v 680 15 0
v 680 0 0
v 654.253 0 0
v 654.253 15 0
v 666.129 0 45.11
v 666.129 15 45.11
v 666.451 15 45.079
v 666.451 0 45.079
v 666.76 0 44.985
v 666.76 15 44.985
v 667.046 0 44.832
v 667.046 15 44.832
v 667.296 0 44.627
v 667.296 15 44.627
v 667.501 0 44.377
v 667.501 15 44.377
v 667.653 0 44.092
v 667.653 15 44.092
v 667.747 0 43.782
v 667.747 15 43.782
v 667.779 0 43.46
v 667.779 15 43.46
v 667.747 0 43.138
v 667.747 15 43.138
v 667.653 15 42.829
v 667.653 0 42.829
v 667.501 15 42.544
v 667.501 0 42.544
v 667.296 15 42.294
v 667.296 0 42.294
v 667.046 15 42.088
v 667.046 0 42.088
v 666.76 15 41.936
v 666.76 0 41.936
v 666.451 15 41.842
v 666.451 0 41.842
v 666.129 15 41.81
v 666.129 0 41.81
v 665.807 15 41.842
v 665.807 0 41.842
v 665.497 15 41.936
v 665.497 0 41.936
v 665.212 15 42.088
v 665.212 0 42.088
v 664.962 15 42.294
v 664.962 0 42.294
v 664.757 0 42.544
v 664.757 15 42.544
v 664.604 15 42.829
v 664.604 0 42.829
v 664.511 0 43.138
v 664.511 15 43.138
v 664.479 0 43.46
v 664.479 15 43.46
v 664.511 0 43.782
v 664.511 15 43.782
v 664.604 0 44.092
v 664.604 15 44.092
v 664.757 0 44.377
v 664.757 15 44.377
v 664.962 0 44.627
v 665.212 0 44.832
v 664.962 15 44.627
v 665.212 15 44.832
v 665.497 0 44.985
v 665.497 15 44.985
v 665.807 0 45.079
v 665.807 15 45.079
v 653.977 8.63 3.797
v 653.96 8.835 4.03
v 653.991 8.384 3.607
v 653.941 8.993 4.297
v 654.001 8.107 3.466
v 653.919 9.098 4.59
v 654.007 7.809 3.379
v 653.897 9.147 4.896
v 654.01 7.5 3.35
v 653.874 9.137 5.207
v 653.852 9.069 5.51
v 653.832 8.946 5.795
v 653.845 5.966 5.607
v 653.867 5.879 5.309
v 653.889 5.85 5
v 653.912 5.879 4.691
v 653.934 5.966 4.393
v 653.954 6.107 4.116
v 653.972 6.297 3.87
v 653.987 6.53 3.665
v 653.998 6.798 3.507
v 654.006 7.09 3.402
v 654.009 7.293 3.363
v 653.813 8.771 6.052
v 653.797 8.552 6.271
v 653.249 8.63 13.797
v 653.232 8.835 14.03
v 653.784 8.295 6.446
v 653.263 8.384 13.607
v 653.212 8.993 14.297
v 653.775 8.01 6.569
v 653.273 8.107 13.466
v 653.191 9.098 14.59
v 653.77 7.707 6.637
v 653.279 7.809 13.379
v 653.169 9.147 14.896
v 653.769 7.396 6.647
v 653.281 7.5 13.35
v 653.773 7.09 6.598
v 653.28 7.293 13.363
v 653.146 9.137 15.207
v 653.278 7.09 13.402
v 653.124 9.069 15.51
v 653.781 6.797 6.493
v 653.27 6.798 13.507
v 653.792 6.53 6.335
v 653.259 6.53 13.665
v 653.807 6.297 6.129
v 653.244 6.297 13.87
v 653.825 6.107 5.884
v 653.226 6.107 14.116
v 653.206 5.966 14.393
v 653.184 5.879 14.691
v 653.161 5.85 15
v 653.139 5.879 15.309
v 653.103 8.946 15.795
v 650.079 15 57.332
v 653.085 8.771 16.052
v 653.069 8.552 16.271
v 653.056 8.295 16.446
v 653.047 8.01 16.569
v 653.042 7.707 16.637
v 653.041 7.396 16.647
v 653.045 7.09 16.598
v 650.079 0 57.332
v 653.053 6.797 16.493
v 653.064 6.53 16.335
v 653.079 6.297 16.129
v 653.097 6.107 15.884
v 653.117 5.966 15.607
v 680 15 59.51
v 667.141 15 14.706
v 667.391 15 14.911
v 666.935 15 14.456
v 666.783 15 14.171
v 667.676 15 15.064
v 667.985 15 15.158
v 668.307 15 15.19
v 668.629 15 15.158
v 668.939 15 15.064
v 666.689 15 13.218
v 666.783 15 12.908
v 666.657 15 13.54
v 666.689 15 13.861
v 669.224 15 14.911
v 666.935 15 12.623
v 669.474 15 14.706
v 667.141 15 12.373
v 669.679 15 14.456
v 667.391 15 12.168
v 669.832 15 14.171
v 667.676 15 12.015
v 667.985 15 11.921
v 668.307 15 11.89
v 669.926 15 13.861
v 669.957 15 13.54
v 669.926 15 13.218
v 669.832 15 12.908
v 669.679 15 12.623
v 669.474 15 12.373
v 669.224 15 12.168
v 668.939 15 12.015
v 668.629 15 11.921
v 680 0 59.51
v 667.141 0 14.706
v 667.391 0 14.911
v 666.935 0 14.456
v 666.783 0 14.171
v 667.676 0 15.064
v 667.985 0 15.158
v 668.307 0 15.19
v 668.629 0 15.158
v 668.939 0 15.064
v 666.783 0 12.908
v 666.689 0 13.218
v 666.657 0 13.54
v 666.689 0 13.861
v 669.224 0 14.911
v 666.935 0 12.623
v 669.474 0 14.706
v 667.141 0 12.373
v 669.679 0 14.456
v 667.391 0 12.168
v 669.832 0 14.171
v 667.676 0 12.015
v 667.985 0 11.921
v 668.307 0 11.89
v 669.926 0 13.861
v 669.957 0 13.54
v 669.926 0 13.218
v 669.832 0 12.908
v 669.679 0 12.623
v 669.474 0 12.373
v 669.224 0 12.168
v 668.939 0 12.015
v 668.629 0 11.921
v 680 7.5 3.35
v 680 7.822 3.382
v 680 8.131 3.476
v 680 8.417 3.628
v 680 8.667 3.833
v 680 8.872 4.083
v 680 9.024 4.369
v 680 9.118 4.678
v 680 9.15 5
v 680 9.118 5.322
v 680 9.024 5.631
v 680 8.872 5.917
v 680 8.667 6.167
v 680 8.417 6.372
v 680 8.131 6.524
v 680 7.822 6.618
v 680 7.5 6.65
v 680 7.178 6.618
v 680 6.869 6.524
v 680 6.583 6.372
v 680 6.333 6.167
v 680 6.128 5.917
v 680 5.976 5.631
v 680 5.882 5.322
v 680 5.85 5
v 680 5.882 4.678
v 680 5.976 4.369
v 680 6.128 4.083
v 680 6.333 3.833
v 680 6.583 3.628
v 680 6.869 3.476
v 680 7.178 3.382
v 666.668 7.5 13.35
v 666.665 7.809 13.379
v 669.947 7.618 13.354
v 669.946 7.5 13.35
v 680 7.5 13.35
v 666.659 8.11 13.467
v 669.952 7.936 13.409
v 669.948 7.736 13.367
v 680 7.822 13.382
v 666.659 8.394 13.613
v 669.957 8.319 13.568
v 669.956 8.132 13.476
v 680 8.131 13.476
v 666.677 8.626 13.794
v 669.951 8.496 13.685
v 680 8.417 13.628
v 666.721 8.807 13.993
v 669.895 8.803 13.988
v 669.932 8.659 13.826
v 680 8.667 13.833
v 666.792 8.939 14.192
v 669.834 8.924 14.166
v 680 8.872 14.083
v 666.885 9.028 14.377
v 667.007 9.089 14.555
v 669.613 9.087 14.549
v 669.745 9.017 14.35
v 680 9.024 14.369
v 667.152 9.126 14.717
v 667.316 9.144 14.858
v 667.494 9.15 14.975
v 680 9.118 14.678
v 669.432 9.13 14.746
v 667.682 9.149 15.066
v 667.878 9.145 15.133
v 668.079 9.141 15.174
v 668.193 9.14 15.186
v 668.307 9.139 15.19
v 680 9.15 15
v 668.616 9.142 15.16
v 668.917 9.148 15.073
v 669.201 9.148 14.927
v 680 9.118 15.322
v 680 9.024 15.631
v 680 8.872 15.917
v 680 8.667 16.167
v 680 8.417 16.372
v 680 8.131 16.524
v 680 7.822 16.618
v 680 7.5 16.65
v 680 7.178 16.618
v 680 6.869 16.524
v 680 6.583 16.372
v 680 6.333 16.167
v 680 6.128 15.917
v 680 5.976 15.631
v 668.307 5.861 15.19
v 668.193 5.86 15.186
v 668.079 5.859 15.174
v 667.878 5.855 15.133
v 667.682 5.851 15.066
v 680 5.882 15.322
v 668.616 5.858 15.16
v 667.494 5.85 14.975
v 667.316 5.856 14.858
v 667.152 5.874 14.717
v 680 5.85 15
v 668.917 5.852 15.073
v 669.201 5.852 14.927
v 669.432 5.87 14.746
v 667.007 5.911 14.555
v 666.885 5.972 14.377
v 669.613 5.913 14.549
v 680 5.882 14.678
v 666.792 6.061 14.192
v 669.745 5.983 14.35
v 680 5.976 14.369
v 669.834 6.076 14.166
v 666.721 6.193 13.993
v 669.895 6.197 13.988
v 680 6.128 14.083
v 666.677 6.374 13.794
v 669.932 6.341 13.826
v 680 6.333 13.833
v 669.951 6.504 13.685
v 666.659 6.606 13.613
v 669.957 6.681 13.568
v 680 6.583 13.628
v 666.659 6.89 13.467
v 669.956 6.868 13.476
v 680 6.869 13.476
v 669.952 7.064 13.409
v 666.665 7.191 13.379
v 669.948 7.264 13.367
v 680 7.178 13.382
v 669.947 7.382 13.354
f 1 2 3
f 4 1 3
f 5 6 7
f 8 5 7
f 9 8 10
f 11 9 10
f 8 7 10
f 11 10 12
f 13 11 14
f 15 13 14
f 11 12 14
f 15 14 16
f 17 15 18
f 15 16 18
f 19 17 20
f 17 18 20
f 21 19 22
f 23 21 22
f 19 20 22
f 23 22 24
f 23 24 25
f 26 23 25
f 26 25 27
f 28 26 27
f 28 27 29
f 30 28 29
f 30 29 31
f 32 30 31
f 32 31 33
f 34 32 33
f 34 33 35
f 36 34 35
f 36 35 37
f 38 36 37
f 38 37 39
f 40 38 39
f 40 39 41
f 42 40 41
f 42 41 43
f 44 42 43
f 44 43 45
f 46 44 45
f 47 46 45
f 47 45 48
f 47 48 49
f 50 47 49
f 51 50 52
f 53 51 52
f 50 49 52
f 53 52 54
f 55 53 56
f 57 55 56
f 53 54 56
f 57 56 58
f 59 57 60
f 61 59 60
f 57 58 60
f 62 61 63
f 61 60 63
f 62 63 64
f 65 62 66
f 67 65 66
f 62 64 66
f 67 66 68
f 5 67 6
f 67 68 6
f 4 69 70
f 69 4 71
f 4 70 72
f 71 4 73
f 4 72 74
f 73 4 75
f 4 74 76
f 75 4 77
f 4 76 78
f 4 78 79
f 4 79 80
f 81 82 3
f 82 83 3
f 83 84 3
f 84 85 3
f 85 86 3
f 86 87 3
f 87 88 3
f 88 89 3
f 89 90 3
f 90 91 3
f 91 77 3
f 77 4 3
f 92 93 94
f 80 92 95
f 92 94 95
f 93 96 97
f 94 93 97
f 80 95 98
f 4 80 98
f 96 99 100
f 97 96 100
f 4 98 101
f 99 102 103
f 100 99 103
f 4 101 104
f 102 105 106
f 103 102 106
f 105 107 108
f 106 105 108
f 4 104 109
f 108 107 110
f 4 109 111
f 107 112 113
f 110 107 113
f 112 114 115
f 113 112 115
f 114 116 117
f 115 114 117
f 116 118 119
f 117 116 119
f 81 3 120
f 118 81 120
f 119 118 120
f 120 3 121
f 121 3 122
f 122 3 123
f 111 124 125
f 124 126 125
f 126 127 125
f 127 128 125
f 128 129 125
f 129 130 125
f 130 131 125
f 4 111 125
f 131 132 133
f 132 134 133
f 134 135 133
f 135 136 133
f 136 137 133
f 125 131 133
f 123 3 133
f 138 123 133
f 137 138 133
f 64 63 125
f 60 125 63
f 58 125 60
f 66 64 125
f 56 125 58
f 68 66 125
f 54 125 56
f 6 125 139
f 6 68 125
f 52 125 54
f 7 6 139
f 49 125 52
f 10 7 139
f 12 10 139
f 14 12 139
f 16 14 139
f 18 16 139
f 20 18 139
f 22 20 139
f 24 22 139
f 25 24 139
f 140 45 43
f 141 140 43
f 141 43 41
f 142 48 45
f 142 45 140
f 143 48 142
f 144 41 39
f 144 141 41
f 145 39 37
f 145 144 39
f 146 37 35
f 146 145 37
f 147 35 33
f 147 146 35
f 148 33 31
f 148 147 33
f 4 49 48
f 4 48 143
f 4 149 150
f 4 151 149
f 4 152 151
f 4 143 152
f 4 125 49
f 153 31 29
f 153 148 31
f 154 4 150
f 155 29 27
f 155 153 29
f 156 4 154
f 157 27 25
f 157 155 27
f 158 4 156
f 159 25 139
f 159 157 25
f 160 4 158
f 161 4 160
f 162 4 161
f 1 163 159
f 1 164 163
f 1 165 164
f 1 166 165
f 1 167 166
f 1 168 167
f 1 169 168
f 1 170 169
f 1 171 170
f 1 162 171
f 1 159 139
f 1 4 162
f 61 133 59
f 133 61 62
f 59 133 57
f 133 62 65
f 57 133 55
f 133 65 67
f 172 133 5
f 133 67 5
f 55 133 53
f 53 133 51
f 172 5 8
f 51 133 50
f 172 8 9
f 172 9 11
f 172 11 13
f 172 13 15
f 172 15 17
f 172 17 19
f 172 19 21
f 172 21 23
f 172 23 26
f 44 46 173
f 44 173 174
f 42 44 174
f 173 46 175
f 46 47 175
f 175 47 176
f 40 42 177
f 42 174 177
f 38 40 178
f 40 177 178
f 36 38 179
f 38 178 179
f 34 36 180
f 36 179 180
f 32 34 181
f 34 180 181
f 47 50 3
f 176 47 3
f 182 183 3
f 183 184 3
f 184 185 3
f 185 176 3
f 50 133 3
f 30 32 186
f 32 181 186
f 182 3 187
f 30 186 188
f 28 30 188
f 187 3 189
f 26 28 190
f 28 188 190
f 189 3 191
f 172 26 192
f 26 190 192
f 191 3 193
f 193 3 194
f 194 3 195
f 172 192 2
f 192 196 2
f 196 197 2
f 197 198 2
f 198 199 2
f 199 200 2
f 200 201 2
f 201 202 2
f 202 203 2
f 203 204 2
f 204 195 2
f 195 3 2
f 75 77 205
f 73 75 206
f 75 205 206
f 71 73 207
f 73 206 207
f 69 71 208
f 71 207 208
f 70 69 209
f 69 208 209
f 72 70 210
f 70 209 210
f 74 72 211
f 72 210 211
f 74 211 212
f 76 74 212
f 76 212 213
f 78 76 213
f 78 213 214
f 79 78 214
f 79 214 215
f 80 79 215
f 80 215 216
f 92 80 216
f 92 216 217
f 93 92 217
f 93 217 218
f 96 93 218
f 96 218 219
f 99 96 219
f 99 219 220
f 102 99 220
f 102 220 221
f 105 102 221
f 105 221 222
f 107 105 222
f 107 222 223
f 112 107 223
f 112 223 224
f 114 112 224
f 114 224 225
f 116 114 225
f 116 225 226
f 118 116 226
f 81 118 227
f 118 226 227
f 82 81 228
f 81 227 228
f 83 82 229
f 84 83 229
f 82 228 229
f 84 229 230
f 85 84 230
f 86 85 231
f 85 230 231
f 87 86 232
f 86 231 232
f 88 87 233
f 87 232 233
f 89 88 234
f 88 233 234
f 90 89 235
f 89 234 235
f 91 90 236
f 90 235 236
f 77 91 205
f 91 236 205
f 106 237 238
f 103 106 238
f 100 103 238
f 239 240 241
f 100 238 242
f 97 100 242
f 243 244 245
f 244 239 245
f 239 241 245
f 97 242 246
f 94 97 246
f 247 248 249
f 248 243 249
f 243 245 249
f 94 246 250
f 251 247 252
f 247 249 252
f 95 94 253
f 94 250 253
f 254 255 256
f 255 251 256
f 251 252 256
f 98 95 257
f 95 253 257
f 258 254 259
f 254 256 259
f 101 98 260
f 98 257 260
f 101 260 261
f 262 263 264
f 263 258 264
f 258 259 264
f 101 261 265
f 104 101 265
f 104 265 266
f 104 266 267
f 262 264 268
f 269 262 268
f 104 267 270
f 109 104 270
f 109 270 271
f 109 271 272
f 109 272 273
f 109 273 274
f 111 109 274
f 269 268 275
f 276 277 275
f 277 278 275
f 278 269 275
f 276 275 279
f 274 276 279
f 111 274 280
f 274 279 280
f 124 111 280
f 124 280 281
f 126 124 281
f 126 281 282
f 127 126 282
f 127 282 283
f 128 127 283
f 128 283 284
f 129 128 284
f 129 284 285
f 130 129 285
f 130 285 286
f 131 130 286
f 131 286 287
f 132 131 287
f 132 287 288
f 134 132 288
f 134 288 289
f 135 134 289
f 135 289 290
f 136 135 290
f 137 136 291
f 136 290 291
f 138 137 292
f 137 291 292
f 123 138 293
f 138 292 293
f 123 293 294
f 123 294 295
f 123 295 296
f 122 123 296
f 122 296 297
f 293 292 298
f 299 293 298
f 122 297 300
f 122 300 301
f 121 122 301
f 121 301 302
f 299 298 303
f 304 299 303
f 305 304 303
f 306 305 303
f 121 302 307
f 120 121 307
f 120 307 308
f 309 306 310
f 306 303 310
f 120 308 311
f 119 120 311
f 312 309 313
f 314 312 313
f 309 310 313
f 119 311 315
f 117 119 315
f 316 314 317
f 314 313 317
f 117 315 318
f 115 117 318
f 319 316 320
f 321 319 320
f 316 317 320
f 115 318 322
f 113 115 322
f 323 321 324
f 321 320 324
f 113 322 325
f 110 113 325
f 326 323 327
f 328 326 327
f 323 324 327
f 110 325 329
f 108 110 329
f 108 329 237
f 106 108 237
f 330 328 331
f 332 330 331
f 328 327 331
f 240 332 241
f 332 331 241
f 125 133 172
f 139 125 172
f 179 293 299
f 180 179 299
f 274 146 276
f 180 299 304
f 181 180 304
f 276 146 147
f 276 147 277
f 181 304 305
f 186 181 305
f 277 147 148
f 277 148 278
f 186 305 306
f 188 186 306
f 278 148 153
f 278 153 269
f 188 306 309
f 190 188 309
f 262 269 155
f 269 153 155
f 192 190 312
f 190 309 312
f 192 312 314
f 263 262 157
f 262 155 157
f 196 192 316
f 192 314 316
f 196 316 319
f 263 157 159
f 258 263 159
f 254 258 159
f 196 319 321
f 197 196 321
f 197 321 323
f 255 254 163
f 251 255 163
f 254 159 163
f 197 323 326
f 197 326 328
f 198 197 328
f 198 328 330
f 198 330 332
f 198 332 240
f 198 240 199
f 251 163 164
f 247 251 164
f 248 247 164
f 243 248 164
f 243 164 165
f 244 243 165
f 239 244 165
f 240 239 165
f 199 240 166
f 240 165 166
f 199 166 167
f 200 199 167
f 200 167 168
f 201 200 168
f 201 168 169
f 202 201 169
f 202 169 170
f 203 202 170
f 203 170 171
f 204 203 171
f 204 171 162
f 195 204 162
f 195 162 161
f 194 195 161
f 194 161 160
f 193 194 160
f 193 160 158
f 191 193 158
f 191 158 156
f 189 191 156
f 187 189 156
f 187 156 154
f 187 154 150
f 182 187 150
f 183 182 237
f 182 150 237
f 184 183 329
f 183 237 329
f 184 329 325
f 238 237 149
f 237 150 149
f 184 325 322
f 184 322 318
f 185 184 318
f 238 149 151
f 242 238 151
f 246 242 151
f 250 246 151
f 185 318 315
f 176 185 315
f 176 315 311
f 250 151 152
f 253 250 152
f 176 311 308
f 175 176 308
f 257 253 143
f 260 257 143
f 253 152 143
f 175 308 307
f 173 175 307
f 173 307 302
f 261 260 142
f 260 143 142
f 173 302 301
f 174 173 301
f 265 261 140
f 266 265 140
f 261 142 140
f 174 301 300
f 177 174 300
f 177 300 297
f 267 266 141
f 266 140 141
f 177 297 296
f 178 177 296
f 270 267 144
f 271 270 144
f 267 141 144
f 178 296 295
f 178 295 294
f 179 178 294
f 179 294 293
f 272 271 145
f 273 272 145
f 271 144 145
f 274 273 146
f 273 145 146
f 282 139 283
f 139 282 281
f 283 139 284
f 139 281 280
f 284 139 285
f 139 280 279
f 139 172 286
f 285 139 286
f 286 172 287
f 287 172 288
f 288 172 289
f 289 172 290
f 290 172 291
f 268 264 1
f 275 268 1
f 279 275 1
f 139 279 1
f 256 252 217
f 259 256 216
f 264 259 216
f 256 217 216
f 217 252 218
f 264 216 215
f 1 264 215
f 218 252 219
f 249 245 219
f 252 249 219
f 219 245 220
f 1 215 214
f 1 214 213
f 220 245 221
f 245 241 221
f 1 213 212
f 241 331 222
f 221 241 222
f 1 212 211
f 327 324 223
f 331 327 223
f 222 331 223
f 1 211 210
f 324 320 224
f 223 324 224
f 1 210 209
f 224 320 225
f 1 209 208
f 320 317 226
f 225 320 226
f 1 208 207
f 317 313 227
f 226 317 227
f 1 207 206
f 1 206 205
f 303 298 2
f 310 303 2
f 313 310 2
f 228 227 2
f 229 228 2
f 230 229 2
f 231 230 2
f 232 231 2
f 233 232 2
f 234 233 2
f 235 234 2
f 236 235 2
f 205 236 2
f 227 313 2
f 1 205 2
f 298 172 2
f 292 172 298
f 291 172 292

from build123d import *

# Parameters (mm, degrees)
EXTRUDE_1_DEPTH     = 15
SKETCH_2_R          = 1.45
CUT_EXTRUDE_1_DEPTH = 683.763824452
SKETCH_3_R          = 1.45
CUT_EXTRUDE_2_DEPTH = 69.276600135
SKETCH_4_R          = 1.65
CUT_EXTRUDE_3_DEPTH = 683.763824553
SKETCH_5_R          = 1.65
CUT_EXTRUDE_4_DEPTH = 69.276600157


with BuildPart() as part:
    # 草图1 → 凸台-拉伸1 (new body)
    with BuildSketch(Plane(origin=(0, 0, 0), x_dir=(1, 0, 0), z_dir=(0, 1, 0))):
        Polygon((654.253441162, 0), (650.079202112, -57.331500941), (680, -59.50999899), (680, 0), align=None)
    extrude(amount=EXTRUDE_1_DEPTH)

    # 草图2 → 切除-拉伸1 (cut, through all)
    with BuildSketch(Plane.XZ):
        with Locations(Location((668.307348129, 13.539553134, 0), (0, 0, 270))):
            Circle(SKETCH_2_R)
        with Locations(Location((666.12885008, 43.460351022, 0), (0, 0, 270))):
            Circle(SKETCH_2_R)
    extrude(amount=-CUT_EXTRUDE_1_DEPTH, mode=Mode.SUBTRACT)

    # 草图3 → 切除-拉伸2 (cut, through all)
    with BuildSketch(Plane(origin=(680, 0, 0), x_dir=(0, 0, -1), z_dir=(1, 0, 0))):
        with Locations((-15, 7.5)):
            Circle(SKETCH_3_R)
        with Locations((-5, 7.5)):
            Circle(SKETCH_3_R)
    extrude(amount=-CUT_EXTRUDE_2_DEPTH, mode=Mode.SUBTRACT)

    # 草图4 → 切除-拉伸3 (cut, through all)
    with BuildSketch(Plane(origin=(0, 15, 0), x_dir=(1, 0, 0), z_dir=(0, 1, 0))):
        with Locations(Location((668.307348129, -13.539553134, 0), (0, 0, 270))):
            Circle(SKETCH_4_R)
        with Locations(Location((666.12885008, -43.460351022, 0), (0, 0, 270))):
            Circle(SKETCH_4_R)
    extrude(amount=-CUT_EXTRUDE_3_DEPTH, mode=Mode.SUBTRACT)

    # 草图5 → 切除-拉伸4 (cut, through all)
    with BuildSketch(Plane(origin=(680, 0, 0), x_dir=(0, 0, -1), z_dir=(1, 0, 0))):
        with Locations((-15, 7.5)):
            Circle(SKETCH_5_R)
        with Locations((-5, 7.5)):
            Circle(SKETCH_5_R)
    extrude(amount=-CUT_EXTRUDE_4_DEPTH, mode=Mode.SUBTRACT)


solid = part.part
